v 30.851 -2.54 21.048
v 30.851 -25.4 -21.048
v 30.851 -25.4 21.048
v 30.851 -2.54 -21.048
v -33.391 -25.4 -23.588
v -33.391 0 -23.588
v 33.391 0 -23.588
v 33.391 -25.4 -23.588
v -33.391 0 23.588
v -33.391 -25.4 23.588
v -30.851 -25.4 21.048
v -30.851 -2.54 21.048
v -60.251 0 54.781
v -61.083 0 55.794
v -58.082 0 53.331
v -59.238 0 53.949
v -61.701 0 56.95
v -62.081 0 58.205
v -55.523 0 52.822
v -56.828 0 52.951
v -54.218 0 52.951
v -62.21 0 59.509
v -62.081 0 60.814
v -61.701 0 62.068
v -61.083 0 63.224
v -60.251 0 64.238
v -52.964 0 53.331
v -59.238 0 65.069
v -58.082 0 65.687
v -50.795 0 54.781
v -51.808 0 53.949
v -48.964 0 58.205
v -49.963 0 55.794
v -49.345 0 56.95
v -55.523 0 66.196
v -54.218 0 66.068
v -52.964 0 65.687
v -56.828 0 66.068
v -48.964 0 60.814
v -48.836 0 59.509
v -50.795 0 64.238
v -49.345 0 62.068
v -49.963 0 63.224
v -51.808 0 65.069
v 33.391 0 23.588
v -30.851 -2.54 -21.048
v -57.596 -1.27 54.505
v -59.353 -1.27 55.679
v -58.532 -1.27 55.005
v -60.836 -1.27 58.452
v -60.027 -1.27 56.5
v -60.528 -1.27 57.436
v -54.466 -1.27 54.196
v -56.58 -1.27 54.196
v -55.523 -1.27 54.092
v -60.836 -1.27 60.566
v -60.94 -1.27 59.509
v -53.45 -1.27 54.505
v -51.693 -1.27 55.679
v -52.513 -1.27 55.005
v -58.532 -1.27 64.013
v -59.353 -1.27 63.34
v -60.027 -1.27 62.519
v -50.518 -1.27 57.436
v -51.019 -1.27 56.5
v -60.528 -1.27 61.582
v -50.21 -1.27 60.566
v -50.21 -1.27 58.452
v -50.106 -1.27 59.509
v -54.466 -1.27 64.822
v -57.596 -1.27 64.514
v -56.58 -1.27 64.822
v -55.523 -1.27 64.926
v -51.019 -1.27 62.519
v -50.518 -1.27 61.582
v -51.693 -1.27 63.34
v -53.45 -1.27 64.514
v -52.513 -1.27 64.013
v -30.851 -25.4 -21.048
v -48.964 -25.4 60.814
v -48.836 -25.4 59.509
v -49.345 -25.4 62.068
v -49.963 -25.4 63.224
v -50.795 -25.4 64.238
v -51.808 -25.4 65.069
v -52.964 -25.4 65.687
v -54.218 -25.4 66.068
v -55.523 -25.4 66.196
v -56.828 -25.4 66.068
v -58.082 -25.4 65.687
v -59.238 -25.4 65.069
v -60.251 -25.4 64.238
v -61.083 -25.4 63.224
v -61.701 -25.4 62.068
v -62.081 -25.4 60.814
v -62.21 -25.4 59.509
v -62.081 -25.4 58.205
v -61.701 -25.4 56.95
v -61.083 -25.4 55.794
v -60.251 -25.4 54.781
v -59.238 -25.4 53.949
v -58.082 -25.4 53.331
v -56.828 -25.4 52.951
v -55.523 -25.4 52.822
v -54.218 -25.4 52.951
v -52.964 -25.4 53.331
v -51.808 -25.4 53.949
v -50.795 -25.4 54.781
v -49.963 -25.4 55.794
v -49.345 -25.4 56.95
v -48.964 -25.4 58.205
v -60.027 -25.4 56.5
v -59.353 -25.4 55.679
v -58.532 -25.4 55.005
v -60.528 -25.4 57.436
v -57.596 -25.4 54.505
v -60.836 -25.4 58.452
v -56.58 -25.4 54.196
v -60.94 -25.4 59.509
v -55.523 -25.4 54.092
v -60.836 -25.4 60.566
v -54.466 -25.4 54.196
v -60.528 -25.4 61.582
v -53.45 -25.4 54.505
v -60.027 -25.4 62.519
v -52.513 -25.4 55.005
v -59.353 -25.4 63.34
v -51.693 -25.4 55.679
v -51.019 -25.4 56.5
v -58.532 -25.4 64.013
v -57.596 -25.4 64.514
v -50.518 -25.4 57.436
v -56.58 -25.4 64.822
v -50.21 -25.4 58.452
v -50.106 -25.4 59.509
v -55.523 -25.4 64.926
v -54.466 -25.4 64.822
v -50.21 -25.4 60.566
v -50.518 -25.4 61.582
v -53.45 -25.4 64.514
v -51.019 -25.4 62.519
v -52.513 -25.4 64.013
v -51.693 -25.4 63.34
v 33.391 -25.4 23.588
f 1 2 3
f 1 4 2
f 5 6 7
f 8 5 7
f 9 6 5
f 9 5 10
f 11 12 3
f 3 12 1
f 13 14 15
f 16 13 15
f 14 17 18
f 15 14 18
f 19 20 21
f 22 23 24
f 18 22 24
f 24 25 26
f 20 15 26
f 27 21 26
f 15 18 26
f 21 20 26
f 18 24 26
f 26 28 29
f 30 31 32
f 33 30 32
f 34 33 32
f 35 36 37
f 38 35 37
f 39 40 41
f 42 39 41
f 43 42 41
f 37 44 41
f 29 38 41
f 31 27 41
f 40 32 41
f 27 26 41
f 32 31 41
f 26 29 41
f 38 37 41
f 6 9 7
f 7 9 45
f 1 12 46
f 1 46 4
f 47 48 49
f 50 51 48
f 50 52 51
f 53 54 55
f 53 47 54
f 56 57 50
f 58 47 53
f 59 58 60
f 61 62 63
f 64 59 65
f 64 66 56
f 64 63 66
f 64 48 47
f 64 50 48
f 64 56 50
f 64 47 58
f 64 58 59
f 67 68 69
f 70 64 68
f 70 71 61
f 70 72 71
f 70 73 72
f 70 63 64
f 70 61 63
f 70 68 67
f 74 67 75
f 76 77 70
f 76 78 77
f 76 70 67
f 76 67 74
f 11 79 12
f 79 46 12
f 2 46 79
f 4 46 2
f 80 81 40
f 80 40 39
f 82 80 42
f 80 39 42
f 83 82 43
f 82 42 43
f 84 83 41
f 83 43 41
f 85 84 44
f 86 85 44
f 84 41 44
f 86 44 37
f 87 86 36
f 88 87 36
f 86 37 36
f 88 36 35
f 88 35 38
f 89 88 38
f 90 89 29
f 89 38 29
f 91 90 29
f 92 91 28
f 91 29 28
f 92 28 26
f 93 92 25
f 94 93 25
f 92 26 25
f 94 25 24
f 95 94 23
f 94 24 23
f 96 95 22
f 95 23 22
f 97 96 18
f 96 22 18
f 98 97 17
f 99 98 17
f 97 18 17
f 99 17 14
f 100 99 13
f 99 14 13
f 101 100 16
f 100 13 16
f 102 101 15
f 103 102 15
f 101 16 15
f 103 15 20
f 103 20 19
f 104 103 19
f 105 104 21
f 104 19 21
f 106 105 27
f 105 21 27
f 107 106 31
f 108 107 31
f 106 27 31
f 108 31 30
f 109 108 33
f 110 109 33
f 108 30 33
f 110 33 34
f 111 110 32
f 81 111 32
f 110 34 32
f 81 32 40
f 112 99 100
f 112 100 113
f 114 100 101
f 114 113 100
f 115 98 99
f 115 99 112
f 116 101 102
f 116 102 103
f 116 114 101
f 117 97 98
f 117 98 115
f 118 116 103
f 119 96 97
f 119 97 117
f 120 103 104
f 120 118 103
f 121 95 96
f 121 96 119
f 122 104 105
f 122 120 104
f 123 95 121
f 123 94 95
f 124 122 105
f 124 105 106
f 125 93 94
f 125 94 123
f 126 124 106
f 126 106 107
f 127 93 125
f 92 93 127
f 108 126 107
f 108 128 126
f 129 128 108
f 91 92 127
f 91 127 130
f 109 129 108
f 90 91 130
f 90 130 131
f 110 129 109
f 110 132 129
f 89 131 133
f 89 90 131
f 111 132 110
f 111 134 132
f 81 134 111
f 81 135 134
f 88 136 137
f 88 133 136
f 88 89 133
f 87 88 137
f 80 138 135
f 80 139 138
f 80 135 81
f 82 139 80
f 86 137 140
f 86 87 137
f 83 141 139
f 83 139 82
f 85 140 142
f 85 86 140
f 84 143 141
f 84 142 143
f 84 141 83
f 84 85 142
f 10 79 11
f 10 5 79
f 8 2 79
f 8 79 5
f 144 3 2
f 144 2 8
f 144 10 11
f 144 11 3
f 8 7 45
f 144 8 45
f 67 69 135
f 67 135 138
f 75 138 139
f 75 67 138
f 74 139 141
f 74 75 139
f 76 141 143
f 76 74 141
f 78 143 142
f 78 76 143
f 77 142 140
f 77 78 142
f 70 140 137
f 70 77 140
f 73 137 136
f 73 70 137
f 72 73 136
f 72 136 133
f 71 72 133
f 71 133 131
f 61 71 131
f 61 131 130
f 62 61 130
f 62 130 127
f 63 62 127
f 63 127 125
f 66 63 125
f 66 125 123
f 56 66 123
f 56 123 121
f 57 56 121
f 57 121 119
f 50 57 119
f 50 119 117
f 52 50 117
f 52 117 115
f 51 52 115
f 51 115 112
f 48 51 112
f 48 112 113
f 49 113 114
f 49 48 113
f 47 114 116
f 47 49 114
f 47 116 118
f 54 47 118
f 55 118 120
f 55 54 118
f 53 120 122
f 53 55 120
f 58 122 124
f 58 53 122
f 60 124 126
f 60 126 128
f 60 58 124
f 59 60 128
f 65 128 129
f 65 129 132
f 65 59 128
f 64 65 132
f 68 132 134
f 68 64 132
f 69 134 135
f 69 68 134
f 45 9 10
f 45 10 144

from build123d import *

# Parameters (mm, degrees)
F0_W     = 66.781222
F0_H     = 47.175732
F1_DEPTH = 25.4
F2_T     = -2.54
F3_R     = 6.687023
F4_DEPTH = 25.4
F5_T     = -1.27


with BuildPart() as f1:
    # F0 (on Front) → F1 (new body)
    with BuildSketch(Plane.XZ):
        Rectangle(F0_W, F0_H)
    extrude(amount=F1_DEPTH)

    # F2
    f2_openings = [f1.faces().sort_by_distance(p)[0] for p in [
        (0, -25.4, 0),
    ]]
    offset(amount=F2_T, openings=f2_openings)


with BuildPart() as f4:
    # F3 (on Front) → F4 (new body)
    with BuildSketch(Plane.XZ):
        with Locations((-55.522956, 59.509221)):
            Circle(F3_R)
    extrude(amount=F4_DEPTH)

    # F5
    f5_openings = [f4.faces().sort_by_distance(p)[0] for p in [
        (-55.522956, -25.4, 59.509221),
    ]]
    offset(amount=F5_T, openings=f5_openings)


solid = Compound([f1.part, f4.part])
